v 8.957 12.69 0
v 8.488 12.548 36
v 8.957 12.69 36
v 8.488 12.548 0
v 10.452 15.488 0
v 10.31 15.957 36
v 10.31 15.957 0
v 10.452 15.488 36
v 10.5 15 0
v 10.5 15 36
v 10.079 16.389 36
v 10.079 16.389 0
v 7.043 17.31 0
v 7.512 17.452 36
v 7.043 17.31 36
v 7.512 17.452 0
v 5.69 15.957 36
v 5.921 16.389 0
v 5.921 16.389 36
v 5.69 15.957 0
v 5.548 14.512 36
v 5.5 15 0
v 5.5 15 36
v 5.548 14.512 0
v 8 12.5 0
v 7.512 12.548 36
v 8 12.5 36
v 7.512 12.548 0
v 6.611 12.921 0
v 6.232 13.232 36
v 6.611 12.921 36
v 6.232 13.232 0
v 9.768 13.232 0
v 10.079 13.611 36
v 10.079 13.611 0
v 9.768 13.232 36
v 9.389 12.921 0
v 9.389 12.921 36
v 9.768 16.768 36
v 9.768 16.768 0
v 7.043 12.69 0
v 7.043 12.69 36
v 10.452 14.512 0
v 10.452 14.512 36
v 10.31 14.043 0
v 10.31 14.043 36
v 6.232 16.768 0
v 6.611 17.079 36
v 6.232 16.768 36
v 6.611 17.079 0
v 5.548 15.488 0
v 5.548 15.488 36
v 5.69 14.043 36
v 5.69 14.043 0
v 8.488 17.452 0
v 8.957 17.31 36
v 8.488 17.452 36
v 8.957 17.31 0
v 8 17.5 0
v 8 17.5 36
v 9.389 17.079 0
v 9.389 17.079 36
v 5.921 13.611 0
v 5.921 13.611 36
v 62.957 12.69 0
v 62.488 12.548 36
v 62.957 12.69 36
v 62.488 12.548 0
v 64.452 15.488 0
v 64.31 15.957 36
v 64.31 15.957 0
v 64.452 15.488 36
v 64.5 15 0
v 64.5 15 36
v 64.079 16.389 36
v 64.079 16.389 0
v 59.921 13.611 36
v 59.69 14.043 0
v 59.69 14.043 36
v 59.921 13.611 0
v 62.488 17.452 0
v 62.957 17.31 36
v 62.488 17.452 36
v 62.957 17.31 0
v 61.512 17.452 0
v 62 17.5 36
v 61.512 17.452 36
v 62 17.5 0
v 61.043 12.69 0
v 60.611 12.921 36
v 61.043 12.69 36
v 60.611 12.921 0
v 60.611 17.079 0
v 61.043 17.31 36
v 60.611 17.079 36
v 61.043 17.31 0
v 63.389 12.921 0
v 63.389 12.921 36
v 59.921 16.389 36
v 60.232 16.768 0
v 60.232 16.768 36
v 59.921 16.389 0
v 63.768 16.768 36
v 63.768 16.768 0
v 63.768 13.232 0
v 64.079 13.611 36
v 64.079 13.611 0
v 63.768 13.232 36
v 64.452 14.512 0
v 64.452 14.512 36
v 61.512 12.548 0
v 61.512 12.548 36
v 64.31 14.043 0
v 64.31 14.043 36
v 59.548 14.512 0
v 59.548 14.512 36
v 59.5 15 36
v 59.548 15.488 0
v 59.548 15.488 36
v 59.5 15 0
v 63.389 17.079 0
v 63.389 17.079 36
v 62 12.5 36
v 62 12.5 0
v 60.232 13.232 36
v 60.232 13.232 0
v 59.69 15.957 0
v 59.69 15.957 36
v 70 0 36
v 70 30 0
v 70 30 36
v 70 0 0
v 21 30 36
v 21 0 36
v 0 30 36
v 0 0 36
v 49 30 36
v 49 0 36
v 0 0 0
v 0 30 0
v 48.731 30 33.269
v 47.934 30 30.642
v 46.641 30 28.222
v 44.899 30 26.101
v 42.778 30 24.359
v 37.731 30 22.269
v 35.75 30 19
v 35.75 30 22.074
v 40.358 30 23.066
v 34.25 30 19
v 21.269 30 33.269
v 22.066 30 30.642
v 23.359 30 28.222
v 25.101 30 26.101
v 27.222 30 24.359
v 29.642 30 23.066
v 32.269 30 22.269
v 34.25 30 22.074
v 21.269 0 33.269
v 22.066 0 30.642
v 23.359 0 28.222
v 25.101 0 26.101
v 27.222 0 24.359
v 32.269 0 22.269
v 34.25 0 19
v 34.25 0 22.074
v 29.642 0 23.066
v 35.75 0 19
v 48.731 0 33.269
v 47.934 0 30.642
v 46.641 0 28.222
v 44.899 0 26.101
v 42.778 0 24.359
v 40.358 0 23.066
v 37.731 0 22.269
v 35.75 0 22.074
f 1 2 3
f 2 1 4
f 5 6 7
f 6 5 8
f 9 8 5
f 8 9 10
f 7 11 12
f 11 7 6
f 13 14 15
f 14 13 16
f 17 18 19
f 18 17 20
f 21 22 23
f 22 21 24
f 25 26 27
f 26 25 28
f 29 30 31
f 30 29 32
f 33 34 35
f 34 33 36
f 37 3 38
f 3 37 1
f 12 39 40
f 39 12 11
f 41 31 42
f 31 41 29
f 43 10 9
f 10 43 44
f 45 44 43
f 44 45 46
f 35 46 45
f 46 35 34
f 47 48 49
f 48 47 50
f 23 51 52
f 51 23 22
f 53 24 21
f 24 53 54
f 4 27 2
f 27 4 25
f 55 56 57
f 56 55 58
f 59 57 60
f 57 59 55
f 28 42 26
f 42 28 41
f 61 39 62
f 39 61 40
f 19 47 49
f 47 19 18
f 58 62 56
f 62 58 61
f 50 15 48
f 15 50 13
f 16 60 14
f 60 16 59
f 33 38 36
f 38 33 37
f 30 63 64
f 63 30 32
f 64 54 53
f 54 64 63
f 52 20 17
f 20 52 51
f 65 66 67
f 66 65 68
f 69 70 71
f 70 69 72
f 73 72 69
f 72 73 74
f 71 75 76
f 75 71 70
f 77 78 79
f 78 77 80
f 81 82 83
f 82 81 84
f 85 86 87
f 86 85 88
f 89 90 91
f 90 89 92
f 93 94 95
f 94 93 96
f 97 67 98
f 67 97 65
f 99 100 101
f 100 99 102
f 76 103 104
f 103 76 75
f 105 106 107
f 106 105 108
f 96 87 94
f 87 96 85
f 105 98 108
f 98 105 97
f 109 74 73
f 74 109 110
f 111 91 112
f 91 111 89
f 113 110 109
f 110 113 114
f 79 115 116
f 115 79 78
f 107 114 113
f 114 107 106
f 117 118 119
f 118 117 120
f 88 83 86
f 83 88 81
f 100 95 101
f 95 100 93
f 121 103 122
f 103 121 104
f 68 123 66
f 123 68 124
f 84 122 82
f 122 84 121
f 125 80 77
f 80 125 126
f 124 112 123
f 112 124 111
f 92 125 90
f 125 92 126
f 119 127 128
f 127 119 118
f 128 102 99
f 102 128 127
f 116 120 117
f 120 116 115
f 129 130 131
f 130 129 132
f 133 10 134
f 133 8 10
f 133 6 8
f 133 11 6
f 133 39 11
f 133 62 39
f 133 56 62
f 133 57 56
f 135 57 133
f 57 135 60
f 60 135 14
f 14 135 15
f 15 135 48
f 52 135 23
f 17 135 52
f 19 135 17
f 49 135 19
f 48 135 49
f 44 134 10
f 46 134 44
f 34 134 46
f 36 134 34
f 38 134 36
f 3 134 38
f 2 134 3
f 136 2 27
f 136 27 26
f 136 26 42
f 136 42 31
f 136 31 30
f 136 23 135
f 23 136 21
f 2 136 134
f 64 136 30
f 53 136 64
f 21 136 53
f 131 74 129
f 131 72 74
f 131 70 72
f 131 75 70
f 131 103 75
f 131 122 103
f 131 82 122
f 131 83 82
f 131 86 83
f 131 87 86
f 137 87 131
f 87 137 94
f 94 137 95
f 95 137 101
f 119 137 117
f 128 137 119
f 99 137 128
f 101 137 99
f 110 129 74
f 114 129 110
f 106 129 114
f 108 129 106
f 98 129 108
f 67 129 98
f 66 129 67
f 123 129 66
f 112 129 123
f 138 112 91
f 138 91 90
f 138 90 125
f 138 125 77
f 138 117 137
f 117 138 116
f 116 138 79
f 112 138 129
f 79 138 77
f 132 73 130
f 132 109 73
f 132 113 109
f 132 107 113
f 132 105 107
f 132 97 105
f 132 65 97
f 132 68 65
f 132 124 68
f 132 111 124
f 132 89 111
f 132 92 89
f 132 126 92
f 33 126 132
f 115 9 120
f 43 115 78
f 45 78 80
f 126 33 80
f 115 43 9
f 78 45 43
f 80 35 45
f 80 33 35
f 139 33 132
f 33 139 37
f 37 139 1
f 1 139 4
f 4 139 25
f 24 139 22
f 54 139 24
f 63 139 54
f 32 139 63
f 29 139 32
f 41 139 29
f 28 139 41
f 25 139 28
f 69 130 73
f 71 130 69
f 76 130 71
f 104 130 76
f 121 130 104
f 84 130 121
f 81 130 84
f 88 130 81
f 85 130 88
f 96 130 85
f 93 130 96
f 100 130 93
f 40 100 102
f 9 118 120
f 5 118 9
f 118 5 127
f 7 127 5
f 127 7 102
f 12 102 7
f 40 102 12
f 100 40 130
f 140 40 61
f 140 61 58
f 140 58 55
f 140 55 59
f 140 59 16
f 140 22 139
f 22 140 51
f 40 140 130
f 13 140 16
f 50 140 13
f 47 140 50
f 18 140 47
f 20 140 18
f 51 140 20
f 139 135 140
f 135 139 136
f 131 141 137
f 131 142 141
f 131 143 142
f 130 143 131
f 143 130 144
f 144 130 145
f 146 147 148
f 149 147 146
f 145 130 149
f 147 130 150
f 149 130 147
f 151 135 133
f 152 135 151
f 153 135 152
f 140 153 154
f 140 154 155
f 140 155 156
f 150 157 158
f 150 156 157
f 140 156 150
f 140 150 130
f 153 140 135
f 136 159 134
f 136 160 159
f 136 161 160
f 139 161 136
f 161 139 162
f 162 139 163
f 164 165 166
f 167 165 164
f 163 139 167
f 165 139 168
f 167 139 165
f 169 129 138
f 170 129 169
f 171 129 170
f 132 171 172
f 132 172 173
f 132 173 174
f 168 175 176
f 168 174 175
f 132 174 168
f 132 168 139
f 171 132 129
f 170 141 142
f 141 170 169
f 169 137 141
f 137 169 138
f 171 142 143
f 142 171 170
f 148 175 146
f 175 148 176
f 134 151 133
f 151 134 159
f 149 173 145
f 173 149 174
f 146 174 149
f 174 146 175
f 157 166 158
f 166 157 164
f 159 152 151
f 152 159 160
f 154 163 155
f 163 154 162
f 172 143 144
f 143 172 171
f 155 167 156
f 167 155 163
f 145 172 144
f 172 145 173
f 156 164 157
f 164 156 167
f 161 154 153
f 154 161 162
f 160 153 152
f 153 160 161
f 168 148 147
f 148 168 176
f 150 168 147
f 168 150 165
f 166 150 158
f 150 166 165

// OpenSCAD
$fn = 32;

// ----------------------------------------------------------------------
// Saddle clamp: split shaft clamp
// ----------------------------------------------------------------------

// --- parameters (mm) ---
blk_l = 70;               // block length, X
blk_w = 30;               // block width, Y
blk_h = 36;               // block height
clamp_r = 14;             // shaft groove radius
hole_r = 2.5;             // bolt hole radius
hole_m = 8;               // bolt hole margin from the ends
saw_w = 1.5;              // saw kerf width

saw_depth = clamp_r + 3;  // saw kerf depth

difference() {
  cube([blk_l, blk_w, blk_h]);
  translate([blk_l / 2, -1, blk_h])
    rotate([-90, 0, 0])
      cylinder(h = blk_w + 2, r = clamp_r);
  for (sx = [0, 1])
    translate([sx ? blk_l - hole_m : hole_m, blk_w / 2, -1])
      cylinder(r = hole_r, h = blk_h + 2);
  translate([blk_l / 2 - saw_w / 2, -1, blk_h - saw_depth])
    cube([saw_w, blk_w + 2, saw_depth + 1]);
}
